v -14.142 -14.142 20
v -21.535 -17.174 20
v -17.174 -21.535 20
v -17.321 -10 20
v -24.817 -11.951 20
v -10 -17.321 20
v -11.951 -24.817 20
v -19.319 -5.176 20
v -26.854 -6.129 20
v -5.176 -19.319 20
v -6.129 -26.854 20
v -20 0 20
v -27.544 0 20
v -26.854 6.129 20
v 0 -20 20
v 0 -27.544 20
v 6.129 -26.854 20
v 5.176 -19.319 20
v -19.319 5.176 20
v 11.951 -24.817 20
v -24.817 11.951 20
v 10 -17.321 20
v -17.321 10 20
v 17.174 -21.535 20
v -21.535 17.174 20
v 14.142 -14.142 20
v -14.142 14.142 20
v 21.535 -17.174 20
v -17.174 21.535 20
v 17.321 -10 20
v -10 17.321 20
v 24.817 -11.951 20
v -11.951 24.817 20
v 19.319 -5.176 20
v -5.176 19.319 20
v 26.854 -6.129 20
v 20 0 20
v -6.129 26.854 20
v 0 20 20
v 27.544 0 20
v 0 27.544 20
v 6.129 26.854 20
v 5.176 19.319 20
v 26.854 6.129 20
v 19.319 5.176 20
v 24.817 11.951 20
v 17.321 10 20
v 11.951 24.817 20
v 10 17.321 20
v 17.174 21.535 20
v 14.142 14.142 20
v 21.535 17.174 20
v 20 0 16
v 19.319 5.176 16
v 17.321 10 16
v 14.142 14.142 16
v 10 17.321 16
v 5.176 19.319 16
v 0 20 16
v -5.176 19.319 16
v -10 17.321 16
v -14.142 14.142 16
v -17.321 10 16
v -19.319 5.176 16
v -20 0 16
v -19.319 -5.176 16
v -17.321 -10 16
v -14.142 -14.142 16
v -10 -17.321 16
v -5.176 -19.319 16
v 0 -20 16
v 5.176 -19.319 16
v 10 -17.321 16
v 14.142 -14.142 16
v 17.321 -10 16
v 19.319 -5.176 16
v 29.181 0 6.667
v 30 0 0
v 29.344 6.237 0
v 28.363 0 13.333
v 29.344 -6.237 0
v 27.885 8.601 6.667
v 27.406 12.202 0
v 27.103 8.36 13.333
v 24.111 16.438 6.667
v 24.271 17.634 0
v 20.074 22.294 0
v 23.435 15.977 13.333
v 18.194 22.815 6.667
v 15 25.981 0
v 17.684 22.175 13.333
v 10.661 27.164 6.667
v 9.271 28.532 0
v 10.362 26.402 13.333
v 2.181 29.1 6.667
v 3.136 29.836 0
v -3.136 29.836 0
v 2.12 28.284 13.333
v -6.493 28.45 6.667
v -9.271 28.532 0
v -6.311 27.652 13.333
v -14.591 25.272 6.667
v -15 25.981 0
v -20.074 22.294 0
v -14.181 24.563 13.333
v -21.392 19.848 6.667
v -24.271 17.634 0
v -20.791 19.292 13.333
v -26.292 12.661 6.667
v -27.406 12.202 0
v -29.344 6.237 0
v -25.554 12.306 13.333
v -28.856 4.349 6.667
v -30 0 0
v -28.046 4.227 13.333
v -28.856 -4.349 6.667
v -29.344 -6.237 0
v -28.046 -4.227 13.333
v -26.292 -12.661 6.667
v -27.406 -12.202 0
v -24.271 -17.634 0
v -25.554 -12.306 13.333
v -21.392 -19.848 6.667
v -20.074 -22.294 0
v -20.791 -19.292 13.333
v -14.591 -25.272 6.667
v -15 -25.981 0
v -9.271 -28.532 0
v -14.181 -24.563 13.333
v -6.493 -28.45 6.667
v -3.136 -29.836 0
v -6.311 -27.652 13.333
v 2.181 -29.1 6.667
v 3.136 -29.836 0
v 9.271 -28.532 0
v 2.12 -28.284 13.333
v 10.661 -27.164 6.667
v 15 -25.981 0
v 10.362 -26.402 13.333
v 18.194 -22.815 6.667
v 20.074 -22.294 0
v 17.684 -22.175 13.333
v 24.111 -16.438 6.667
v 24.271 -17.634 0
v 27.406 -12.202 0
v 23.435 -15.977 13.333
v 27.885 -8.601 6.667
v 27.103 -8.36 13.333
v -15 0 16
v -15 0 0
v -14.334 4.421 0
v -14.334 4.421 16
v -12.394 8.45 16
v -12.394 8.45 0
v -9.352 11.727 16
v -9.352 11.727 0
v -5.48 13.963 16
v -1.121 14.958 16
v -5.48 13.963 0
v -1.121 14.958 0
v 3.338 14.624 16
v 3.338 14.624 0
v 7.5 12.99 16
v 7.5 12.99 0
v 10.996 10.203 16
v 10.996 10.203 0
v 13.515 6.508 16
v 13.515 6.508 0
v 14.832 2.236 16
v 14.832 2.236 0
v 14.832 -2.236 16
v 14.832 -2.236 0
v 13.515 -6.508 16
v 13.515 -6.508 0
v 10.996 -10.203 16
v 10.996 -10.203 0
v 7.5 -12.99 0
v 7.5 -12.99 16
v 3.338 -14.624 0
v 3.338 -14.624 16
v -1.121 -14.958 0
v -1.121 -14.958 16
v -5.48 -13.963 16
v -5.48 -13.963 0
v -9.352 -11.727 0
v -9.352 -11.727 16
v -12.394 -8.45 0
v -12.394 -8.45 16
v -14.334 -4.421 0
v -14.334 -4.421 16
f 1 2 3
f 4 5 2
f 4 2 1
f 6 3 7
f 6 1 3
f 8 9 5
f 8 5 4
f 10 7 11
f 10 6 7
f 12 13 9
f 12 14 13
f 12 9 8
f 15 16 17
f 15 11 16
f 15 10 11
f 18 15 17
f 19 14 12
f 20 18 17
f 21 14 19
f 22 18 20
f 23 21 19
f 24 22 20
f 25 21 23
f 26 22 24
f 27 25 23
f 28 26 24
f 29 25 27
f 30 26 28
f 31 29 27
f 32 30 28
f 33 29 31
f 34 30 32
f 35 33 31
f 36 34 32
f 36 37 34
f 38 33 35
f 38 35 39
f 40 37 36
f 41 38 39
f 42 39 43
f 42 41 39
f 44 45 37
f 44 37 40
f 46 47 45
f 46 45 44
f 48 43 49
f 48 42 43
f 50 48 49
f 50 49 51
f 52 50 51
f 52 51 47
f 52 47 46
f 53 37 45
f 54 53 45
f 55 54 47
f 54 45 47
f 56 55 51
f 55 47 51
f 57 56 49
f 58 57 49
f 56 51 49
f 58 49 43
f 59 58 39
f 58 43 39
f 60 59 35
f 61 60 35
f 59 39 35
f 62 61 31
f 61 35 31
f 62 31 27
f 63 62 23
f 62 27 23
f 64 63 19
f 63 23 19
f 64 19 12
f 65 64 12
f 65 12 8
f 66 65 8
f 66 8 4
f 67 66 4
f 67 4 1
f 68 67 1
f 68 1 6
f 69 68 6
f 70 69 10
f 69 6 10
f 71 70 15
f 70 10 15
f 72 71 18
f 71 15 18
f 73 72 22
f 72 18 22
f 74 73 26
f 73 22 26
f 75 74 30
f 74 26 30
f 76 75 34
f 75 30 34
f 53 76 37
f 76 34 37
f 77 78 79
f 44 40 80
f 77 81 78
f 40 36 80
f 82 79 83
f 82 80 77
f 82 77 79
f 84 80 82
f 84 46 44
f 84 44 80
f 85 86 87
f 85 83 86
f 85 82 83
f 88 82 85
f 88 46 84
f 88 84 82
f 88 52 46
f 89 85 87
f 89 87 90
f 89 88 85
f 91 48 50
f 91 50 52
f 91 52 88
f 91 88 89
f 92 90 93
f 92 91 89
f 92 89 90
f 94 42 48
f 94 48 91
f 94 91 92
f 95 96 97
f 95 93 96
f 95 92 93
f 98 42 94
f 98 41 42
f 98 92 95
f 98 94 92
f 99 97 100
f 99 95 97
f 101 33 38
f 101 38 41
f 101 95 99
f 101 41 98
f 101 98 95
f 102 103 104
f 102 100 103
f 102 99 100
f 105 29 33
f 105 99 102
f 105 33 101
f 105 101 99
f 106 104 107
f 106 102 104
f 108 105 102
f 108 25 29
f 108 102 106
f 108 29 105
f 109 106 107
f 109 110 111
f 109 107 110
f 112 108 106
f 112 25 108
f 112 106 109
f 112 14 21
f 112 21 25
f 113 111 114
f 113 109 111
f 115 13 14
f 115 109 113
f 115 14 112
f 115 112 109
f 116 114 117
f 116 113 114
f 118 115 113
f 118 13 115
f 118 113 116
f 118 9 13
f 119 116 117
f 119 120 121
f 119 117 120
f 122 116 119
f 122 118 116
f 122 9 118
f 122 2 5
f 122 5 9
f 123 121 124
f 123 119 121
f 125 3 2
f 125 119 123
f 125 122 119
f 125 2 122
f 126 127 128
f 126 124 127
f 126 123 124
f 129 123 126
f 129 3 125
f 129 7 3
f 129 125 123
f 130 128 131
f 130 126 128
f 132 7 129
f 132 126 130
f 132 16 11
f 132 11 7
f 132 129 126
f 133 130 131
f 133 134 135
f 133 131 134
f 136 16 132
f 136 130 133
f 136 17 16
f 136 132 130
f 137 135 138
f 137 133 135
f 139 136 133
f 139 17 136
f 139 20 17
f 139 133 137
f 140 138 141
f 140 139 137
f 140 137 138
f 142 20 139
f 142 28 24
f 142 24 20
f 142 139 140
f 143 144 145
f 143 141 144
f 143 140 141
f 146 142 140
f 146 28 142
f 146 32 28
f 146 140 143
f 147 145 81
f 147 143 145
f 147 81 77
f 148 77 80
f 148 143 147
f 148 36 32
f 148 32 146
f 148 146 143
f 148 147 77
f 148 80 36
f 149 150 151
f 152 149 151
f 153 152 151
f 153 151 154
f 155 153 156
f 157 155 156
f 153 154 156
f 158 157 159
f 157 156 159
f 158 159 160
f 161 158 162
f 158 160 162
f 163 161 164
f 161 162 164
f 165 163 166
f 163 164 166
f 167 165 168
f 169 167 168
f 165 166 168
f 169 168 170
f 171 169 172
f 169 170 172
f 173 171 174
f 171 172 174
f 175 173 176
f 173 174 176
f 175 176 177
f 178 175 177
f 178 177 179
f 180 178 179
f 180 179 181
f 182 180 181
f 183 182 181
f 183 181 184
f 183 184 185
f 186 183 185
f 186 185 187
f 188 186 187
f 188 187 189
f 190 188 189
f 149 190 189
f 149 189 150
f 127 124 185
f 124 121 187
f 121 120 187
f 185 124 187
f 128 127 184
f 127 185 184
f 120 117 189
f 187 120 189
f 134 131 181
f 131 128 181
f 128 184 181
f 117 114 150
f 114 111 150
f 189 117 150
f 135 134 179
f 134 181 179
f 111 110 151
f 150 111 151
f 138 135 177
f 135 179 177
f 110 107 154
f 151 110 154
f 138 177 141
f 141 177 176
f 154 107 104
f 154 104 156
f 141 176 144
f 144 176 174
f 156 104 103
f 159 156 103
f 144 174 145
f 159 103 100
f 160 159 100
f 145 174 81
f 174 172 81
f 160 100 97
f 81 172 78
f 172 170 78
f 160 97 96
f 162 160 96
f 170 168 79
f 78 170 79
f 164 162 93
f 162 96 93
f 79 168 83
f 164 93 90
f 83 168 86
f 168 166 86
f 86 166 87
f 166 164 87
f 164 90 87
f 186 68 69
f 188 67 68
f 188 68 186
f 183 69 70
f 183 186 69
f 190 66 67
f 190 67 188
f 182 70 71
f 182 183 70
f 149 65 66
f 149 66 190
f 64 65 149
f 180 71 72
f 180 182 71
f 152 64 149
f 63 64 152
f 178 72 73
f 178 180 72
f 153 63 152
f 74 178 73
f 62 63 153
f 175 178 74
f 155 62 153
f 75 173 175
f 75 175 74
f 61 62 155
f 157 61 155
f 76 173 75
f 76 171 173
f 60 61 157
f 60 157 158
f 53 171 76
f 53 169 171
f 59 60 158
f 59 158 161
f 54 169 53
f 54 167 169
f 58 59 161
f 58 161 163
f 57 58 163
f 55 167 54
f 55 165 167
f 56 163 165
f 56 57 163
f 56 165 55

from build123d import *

# Parameters (mm, degrees)
SKETCH1_R           = 30
BOSS_EXTRUDE1_DEPTH = 20
BOSS_EXTRUDE1_TAPER = 7
SKETCH3_R           = 15
CUT_EXTRUDE1_DEPTH  = 21
SKETCH5_R           = 20
CUT_EXTRUDE2_DEPTH  = 4


with BuildPart() as part:
    # Sketch1 → Boss-Extrude1 (new body)
    with BuildSketch(Plane.XY):
        Circle(SKETCH1_R)
    extrude(amount=BOSS_EXTRUDE1_DEPTH, taper=BOSS_EXTRUDE1_TAPER)

    # Sketch3 → Cut-Extrude1 (cut, through all)
    with BuildSketch(Plane(origin=(0, 0, 0), x_dir=(-1, 0, 0), z_dir=(0, 0, -1))):
        Circle(SKETCH3_R)
    extrude(amount=-CUT_EXTRUDE1_DEPTH, mode=Mode.SUBTRACT)

    # Sketch5 → Cut-Extrude2 (cut)
    with BuildSketch(Plane.XY.offset(20)):
        Circle(SKETCH5_R)
    extrude(amount=-CUT_EXTRUDE2_DEPTH, mode=Mode.SUBTRACT)


solid = part.part
